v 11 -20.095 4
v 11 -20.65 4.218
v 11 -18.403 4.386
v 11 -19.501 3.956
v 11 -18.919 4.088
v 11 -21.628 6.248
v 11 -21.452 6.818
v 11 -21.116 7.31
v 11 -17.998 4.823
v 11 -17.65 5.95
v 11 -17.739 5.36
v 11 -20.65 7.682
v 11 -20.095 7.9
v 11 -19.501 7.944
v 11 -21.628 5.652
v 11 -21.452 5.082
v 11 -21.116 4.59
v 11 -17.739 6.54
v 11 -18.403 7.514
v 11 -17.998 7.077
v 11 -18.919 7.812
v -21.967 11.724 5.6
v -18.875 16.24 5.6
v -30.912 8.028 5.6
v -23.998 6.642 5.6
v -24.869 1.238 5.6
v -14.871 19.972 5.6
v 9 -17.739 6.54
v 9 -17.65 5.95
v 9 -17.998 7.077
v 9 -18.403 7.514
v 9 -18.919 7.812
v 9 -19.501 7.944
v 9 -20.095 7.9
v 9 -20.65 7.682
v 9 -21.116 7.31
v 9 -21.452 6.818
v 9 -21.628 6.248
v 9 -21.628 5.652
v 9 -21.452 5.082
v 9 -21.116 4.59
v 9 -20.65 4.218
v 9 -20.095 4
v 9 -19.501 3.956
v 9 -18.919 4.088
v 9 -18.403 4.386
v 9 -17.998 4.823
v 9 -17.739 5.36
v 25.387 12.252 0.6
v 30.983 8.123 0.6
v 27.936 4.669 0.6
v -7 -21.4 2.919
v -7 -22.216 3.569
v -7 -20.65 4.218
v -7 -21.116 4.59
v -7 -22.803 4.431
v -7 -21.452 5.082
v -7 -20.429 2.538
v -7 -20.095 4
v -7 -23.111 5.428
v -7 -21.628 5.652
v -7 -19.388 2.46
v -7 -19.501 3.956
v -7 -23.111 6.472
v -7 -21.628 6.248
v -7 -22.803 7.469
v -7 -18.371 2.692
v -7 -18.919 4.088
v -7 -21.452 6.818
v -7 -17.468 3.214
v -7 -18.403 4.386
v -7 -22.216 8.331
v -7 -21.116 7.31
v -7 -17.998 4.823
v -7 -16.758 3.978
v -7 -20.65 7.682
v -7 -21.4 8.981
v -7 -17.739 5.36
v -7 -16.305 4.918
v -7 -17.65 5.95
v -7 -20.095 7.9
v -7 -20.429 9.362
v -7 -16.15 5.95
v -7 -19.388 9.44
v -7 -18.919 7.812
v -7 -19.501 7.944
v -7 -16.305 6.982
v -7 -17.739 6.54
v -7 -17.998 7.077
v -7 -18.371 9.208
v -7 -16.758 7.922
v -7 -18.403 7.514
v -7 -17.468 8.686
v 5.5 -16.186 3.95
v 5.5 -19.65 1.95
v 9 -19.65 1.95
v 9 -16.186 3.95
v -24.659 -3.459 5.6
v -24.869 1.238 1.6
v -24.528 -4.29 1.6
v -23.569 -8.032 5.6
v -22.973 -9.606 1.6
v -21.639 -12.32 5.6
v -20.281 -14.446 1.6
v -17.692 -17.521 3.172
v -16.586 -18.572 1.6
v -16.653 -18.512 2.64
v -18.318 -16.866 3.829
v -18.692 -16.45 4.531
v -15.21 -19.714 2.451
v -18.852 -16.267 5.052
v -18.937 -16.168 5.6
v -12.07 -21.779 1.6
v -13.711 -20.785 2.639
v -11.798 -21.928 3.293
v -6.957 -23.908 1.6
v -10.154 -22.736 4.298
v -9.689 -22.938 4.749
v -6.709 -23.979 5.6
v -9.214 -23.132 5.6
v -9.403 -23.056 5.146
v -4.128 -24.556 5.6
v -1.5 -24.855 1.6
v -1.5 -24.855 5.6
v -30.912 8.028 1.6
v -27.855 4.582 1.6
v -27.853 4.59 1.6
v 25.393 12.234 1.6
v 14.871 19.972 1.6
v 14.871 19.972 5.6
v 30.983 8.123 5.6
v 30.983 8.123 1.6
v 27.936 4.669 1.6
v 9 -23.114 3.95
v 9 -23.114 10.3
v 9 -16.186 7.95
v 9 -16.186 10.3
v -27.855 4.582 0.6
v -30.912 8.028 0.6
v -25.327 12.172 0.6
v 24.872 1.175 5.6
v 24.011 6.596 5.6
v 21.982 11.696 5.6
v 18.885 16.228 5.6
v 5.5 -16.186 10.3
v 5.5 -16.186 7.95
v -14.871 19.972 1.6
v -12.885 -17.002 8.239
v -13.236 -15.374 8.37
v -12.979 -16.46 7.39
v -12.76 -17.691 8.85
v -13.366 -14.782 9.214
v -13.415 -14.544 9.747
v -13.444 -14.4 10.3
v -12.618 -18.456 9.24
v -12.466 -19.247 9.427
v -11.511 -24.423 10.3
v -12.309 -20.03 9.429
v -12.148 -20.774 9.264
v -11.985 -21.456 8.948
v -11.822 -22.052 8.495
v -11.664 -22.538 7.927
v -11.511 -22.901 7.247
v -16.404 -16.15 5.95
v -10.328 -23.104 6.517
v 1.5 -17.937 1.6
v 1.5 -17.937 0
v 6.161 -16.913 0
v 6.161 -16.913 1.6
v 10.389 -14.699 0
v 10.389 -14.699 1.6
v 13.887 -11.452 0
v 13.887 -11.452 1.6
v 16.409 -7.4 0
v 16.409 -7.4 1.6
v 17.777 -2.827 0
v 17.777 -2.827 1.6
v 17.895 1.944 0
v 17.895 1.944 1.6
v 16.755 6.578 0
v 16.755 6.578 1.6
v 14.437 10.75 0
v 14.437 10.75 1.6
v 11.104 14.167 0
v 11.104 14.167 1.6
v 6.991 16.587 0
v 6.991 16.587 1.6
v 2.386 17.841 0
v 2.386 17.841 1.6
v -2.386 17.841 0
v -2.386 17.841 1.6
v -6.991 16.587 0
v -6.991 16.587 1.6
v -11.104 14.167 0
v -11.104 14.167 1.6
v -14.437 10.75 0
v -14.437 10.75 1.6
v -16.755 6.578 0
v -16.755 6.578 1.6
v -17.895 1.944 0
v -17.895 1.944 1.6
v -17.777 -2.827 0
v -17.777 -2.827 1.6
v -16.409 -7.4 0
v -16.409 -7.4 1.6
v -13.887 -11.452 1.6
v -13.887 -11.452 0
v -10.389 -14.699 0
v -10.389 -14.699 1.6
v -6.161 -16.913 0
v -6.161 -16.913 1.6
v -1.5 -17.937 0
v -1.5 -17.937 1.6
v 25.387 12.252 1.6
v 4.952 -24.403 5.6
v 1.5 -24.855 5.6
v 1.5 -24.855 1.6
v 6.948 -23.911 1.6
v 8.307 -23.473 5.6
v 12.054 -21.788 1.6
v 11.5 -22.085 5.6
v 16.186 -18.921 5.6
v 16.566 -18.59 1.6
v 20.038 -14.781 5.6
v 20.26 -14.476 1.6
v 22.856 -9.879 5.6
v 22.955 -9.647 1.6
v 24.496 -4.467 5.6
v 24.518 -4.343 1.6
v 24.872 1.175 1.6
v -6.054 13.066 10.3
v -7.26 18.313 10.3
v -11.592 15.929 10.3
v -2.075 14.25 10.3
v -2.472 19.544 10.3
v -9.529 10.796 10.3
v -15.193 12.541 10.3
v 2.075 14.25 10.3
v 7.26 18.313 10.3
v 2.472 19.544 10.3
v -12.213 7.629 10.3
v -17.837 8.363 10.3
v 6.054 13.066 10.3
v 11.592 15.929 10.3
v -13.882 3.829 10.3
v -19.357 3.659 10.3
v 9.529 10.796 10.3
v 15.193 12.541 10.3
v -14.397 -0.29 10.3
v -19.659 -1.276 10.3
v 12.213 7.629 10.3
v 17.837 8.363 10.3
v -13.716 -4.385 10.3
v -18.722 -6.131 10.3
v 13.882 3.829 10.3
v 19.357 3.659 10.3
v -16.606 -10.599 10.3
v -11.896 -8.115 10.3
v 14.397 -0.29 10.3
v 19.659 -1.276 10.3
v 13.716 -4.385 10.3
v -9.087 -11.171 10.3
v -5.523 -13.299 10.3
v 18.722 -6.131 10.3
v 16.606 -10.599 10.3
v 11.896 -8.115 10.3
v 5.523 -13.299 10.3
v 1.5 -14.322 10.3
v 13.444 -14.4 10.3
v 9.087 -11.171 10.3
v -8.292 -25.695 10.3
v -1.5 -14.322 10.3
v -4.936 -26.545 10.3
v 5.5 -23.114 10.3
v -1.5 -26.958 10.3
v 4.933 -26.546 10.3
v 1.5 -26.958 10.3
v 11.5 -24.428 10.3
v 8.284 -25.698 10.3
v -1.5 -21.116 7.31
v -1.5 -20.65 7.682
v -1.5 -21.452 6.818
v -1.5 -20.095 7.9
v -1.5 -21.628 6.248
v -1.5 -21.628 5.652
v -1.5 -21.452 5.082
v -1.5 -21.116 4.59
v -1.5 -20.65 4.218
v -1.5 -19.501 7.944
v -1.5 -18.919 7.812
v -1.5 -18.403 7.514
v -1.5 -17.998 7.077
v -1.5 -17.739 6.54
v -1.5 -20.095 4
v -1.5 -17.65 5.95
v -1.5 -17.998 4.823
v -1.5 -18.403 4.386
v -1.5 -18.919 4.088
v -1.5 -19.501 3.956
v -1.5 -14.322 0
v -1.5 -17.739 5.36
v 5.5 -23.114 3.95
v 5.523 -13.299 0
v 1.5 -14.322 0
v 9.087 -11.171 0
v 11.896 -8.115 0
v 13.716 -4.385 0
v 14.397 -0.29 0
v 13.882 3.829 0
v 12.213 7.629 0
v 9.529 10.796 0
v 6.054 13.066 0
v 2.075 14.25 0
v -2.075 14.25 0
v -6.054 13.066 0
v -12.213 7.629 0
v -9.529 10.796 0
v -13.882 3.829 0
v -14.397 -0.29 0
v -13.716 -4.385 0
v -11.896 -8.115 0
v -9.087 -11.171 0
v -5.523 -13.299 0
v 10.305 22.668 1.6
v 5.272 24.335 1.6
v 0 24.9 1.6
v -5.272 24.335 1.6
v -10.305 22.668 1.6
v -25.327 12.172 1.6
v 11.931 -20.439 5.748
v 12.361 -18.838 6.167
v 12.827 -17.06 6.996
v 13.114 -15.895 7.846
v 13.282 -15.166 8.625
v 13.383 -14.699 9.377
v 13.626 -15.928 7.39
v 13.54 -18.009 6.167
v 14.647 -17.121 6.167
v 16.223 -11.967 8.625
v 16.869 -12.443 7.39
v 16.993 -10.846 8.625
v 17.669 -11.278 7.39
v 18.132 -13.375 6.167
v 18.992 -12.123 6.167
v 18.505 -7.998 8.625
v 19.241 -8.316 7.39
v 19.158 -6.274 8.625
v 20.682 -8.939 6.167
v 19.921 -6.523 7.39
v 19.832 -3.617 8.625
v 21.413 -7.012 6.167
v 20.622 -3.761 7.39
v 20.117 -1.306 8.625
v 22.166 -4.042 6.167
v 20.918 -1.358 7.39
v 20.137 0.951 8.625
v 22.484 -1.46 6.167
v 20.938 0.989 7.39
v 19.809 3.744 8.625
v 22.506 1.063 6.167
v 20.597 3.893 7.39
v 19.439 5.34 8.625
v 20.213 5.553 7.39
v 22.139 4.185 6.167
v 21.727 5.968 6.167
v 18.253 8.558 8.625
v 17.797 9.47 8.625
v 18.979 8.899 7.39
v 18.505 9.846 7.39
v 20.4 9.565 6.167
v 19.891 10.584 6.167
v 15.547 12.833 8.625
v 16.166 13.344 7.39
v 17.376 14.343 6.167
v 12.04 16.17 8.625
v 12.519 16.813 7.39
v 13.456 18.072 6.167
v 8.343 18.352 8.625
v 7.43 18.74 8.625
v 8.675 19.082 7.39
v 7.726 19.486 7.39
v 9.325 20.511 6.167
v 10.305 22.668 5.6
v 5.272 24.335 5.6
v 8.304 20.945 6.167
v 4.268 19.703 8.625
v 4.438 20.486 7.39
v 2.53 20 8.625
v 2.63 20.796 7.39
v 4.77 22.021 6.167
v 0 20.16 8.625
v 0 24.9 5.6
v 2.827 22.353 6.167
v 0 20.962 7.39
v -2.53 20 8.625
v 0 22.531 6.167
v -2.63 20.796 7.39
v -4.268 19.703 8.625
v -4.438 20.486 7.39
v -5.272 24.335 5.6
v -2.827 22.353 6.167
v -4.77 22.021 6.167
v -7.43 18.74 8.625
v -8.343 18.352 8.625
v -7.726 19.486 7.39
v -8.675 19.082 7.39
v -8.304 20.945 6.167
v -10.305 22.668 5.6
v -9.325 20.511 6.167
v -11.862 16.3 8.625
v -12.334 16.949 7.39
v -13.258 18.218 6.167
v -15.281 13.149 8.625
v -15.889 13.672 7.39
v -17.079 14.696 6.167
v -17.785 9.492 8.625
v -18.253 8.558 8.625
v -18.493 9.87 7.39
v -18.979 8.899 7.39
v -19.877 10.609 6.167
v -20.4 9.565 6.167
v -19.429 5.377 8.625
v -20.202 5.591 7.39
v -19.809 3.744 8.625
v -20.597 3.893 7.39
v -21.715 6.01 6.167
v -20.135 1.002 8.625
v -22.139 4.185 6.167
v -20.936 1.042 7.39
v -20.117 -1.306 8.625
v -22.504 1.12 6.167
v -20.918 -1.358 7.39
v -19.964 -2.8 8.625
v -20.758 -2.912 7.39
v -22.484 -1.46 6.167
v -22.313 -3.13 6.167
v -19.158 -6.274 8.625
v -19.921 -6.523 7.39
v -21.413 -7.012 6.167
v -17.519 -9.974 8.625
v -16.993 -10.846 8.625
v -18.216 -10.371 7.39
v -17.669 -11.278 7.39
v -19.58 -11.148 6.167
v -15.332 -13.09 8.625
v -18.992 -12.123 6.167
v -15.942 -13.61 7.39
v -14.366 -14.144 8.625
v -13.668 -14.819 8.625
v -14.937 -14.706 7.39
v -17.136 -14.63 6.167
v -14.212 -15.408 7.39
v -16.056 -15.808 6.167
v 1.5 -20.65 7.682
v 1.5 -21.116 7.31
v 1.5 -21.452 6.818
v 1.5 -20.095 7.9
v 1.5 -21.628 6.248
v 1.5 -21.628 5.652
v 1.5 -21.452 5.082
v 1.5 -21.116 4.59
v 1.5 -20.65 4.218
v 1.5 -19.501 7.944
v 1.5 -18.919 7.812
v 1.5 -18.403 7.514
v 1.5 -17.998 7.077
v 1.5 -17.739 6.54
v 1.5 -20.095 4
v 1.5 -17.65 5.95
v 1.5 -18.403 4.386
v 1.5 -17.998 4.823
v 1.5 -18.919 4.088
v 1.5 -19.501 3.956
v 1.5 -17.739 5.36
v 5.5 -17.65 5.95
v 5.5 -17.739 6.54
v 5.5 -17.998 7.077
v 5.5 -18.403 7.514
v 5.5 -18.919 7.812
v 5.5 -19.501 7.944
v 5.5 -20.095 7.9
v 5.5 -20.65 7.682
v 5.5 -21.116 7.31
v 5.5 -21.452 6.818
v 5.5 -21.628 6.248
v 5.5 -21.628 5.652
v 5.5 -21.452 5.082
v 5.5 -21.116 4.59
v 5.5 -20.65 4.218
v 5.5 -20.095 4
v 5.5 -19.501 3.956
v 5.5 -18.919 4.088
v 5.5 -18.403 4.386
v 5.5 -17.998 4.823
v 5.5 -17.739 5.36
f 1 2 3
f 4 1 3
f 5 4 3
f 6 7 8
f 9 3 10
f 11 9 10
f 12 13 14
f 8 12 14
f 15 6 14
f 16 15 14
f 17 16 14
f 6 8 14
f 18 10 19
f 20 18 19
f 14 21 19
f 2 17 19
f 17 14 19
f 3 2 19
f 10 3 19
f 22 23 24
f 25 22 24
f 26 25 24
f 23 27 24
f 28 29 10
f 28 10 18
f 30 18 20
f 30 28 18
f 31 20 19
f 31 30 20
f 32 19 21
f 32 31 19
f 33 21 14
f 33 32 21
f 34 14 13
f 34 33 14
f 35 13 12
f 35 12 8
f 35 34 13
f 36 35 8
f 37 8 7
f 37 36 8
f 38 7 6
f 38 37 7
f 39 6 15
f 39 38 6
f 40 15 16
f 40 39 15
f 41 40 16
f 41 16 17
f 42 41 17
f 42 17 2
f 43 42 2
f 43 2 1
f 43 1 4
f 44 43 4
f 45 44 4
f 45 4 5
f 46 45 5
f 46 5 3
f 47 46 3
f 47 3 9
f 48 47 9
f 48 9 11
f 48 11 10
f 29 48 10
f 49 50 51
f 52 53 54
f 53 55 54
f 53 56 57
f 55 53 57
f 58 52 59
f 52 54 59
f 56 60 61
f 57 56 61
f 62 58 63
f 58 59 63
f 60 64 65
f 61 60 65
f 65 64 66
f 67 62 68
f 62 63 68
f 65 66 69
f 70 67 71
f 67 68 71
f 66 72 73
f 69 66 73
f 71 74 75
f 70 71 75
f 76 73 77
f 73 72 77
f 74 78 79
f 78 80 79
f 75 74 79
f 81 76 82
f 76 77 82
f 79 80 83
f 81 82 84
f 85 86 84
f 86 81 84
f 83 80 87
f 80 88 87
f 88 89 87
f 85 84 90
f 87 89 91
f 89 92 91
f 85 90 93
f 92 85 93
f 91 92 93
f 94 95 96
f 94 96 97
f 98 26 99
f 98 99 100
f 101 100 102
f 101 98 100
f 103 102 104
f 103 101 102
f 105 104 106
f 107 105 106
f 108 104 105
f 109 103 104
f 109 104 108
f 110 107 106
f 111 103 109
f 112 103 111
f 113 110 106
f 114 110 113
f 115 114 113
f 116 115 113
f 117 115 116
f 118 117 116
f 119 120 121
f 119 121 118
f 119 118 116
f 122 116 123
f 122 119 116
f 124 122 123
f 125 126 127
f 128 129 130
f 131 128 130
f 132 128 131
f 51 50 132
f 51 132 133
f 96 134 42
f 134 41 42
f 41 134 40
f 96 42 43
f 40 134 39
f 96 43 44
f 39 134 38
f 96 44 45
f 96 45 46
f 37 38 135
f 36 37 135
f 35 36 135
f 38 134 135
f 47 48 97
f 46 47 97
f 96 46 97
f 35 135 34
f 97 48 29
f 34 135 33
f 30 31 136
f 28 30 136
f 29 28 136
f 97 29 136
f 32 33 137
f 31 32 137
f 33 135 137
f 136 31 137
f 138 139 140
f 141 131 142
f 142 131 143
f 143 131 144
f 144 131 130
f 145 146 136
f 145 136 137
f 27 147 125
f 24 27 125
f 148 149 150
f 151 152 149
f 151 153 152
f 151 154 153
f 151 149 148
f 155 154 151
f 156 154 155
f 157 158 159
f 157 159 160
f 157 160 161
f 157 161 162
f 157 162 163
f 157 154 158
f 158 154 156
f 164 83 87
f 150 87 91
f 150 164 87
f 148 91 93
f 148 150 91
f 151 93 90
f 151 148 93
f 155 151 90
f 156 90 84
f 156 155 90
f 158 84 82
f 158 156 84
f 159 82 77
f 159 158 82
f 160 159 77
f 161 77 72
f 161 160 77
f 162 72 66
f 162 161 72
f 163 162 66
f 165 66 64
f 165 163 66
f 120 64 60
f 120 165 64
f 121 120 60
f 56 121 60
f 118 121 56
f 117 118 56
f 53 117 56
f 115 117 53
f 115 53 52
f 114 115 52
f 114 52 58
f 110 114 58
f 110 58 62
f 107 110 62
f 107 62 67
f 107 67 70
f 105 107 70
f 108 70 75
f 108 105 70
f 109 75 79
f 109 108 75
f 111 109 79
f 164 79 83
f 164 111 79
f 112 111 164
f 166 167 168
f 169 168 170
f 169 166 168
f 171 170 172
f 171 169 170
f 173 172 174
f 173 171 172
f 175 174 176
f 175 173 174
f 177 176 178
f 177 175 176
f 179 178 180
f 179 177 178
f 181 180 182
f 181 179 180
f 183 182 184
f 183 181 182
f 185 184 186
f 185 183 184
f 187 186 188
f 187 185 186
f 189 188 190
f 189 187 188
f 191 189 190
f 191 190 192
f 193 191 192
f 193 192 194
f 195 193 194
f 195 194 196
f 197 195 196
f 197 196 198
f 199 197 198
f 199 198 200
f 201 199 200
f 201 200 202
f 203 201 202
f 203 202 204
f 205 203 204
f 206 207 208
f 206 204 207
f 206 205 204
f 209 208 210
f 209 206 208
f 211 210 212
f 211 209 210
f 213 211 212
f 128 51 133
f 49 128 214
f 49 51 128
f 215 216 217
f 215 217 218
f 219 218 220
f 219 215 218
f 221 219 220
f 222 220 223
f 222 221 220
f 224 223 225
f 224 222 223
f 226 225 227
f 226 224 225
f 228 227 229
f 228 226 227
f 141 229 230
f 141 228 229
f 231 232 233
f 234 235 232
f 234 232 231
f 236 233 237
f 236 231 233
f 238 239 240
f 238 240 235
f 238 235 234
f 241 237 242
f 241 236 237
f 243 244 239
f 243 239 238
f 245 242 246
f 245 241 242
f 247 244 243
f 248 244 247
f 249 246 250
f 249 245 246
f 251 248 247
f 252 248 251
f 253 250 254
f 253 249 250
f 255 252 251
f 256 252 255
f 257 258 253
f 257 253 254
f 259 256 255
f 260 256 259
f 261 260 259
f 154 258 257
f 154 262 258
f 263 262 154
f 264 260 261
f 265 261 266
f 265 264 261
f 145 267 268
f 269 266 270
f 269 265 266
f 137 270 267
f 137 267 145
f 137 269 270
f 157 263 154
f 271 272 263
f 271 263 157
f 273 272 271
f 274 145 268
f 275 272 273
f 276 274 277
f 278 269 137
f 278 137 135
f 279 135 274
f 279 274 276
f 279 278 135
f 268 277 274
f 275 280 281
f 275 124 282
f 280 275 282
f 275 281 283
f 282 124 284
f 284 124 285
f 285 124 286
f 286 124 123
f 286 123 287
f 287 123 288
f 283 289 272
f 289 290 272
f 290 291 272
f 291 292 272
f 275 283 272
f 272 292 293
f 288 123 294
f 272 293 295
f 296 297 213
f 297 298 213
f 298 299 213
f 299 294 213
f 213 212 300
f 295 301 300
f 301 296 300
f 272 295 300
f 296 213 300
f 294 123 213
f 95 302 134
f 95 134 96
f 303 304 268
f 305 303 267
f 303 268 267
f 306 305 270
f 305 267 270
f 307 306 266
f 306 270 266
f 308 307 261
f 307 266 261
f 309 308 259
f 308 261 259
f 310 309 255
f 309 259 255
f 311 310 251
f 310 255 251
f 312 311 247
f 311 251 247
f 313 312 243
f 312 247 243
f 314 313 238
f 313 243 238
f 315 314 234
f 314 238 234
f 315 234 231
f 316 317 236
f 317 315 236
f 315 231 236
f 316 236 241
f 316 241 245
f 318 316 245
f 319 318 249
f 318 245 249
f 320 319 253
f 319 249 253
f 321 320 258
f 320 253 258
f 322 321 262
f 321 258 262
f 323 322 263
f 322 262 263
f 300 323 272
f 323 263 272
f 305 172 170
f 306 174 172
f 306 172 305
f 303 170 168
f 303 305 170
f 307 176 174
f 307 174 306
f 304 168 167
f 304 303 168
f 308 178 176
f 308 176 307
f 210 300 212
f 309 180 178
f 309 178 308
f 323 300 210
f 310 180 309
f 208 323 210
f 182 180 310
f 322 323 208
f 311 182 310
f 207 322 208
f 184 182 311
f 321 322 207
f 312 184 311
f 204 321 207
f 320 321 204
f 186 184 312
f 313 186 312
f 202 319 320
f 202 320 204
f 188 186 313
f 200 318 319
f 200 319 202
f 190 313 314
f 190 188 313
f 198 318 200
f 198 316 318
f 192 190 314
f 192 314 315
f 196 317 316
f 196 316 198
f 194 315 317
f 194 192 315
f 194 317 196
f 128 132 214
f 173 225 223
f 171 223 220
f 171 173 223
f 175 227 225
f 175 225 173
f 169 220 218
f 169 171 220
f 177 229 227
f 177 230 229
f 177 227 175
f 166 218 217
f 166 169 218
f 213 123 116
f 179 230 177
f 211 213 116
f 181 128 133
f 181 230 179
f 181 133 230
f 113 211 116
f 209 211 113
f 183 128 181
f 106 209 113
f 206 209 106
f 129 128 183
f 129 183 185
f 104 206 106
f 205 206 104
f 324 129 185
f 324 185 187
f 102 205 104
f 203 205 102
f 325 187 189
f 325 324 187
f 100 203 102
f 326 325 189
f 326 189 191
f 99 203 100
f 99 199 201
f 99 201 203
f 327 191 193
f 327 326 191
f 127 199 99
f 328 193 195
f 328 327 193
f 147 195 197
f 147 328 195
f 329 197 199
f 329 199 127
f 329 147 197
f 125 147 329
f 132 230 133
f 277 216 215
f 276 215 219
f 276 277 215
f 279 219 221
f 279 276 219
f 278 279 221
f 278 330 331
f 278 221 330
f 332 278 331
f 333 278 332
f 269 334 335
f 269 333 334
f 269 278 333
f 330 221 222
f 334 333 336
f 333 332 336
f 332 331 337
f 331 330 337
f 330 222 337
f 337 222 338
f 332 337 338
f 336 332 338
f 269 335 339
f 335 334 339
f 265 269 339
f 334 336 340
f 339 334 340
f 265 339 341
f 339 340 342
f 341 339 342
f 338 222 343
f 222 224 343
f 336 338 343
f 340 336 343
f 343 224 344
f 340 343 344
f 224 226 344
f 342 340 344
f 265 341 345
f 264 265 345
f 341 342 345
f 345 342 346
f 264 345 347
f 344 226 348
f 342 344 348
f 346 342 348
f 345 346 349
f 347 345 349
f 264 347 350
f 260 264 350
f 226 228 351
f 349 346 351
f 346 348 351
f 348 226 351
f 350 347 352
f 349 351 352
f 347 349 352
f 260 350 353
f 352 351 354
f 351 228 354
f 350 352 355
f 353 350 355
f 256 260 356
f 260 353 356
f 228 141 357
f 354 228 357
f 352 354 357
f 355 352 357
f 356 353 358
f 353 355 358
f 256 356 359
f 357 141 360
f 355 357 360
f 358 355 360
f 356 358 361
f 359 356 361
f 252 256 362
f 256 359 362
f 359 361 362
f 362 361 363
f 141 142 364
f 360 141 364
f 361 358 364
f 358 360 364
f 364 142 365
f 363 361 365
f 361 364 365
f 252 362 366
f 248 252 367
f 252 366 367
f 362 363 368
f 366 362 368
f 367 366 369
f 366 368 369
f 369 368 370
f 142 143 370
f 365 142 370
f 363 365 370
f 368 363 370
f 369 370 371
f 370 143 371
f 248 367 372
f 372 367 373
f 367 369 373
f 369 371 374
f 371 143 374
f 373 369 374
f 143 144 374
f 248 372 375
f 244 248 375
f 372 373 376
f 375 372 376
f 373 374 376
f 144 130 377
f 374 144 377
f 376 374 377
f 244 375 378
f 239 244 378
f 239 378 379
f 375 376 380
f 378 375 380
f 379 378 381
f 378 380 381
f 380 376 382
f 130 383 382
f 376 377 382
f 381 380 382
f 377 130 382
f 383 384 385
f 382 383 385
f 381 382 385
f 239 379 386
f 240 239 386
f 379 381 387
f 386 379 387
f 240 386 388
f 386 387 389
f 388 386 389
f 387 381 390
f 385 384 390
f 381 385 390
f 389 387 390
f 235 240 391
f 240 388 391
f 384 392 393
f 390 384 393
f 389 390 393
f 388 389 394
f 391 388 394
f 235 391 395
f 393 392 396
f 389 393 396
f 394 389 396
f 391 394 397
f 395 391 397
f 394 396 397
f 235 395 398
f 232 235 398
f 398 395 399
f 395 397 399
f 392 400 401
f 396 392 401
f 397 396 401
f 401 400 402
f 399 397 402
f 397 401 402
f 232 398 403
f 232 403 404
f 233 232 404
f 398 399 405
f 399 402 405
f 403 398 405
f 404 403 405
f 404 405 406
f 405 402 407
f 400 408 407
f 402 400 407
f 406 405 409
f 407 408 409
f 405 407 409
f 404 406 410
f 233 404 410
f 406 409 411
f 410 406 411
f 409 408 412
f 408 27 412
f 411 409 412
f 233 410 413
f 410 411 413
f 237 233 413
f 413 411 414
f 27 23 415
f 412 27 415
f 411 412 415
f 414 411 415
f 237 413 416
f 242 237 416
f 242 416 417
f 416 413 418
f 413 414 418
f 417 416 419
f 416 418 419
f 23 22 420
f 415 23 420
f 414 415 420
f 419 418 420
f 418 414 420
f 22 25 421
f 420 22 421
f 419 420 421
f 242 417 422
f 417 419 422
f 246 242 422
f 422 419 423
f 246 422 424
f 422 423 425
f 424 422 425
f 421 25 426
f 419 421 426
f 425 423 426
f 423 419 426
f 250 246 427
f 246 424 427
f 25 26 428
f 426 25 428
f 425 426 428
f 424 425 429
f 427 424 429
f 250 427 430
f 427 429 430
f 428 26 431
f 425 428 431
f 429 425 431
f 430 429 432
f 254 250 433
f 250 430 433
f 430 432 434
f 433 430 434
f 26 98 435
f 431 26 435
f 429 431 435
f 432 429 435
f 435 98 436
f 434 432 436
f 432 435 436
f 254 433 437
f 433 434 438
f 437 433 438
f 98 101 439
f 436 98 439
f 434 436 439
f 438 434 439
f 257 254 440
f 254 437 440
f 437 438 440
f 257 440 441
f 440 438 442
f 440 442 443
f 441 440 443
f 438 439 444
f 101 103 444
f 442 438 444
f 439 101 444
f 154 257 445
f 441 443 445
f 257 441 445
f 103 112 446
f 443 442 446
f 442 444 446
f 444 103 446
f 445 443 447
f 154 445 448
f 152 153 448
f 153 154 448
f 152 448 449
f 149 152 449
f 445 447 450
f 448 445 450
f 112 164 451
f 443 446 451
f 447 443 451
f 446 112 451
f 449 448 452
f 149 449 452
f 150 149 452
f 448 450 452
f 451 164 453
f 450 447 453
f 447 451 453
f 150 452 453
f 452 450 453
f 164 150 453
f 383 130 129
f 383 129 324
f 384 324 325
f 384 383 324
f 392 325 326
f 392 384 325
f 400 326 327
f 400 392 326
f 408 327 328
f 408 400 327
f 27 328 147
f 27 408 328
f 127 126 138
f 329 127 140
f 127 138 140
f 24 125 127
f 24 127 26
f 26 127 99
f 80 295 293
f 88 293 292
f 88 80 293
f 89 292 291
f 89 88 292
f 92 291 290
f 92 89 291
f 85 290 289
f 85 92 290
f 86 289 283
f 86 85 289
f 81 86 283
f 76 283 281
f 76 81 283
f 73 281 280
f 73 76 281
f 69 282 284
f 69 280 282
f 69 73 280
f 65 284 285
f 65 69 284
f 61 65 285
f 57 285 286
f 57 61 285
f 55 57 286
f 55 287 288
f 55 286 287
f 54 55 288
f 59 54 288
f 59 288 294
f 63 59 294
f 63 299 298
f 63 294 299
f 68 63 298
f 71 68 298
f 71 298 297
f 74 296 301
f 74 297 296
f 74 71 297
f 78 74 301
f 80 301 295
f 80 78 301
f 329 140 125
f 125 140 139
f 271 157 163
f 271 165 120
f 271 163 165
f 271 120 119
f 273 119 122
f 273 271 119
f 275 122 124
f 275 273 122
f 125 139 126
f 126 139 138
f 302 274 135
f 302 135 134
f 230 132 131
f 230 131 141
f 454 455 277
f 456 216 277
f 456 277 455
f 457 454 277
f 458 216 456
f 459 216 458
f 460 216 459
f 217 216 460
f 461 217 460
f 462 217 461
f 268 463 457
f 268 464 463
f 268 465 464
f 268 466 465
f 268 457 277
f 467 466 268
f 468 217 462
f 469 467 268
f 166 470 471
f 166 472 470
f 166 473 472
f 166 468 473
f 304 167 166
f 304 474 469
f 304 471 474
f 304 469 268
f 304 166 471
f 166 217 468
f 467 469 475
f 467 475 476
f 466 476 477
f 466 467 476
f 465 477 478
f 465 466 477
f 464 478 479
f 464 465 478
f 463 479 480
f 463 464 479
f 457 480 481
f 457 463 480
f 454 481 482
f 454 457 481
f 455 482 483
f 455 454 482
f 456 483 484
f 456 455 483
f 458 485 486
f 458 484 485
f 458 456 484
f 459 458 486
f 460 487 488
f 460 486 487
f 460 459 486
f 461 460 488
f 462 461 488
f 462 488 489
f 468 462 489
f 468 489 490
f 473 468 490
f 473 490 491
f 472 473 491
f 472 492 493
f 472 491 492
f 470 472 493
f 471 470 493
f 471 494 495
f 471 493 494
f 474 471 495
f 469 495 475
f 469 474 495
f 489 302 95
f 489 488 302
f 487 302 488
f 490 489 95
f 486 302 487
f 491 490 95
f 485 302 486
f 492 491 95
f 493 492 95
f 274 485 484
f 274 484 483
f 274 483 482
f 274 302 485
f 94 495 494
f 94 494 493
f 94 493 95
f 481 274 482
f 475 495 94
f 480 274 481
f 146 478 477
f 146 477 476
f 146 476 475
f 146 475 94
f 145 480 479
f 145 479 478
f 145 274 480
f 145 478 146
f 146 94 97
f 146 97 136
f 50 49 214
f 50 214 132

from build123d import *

# Parameters (mm, degrees)
SKETCH003_W     = 3
SKETCH003_H     = 17
POCKET_DEPTH    = 11
SKETCH004_R     = 3.5
POCKET001_DEPTH = 15
SKETCH005_R     = 2
POCKET002_DEPTH = 18
POCKET003_DEPTH = 3.5
PAD_DEPTH       = 4
PAD001_DEPTH    = 1


with BuildPart() as part:
    # Sketch → Revolution (revolve)
    with BuildSketch(Plane.XZ):
        with BuildLine():
            Line((14.4, 0), (14.4, 10.3))
            Line((14.4, 10.3), (19.7, 10.3))
            ThreePointArc((19.7, 10.3), (21.39536, 6.949122), (24.9, 5.6))
            Line((24.9, 1.6), (24.9, 5.6))
            Line((18, 1.6), (24.9, 1.6))
            Line((18, 0), (18, 1.6))
            Line((14.4, 0), (18, 0))
        make_face()
    revolve(axis=Axis((0, 0, 0), (0, 0, 1)))

    # Sketch002 → AdditiveLoft section 0
    with BuildSketch(Plane.XY.offset(5.6)):
        with BuildLine():
            ThreePointArc((-11.510788, -22.079668), (-0.006082, -24.899999), (11.5, -22.085289))
            Line((13.443585, -14.4), (11.5, -22.085289))
            Line((-13.443585, -14.4), (13.443585, -14.4))
            Line((-11.510788, -22.079668), (-13.443585, -14.4))
        make_face()
    # Sketch001 → AdditiveLoft section 1
    with BuildSketch(Plane.XY.offset(10.3)):
        with BuildLine():
            ThreePointArc((-11.510788, -24.423386), (-0.005962, -26.999999), (11.5, -24.428467))
            Line((13.443585, -14.4), (11.5, -24.428467))
            Line((-13.443585, -14.4), (13.443585, -14.4))
            Line((-11.510788, -24.423386), (-13.443585, -14.4))
        make_face()
    loft()

    # Sketch003 → Pocket (cut)
    with BuildSketch(Plane.XY):
        with Locations((0, -20.5)):
            Rectangle(SKETCH003_W, SKETCH003_H)
    extrude(amount=POCKET_DEPTH, mode=Mode.SUBTRACT)

    # Sketch004 → Pocket001 (cut)
    with BuildSketch(Plane.YZ.offset(-22)):
        with Locations((-19.65, 5.95)):
            Circle(SKETCH004_R)
    extrude(amount=POCKET001_DEPTH, mode=Mode.SUBTRACT)

    # Sketch005 → Pocket002 (cut)
    with BuildSketch(Plane.YZ.offset(-7)):
        with Locations((-19.65, 5.95)):
            Circle(SKETCH005_R)
    extrude(amount=POCKET002_DEPTH, mode=Mode.SUBTRACT)

    # Sketch006 → Pocket003 (cut)
    with BuildSketch(Plane.YZ.offset(5.5)):
        Polygon((-16.185898, 3.950001), (-16.185899, 7.950001), (-16.185899, 15.950001), (-23.114102, 15.95), (-23.114102, 3.950001), (-19.65, 1.95), align=None)
    extrude(amount=POCKET003_DEPTH, mode=Mode.SUBTRACT)

    # Sketch007 → Pad (join)
    with BuildSketch(Plane.XY.offset(1.6)):
        with BuildLine():
            ThreePointArc((-14.87057, 19.971884), (-21.967056, 11.724267), (-24.869203, 1.238045))
            Line((-30.912244, 8.027651), (-24.869203, 1.238045))
            Line((-14.87057, 19.971884), (-30.912244, 8.027651))
        make_face()
        with BuildLine():
            Line((14.870569, 19.971885), (30.983027, 8.123311))
            Line((30.983027, 8.123311), (24.87227, 1.174812))
            ThreePointArc((24.87227, 1.174812), (21.981943, 11.696333), (14.870569, 19.971885))
        make_face()
    extrude(amount=PAD_DEPTH)

    # Sketch008 → Pad001 (join)
    with BuildSketch(Plane.XY.offset(0.6)):
        Polygon((25.386727, 12.252334), (30.983027, 8.123311), (27.935703, 4.669279), align=None)
        Polygon((-25.32744, 12.17221), (-30.912244, 8.027651), (-27.855333, 4.582101), align=None)
    extrude(amount=PAD001_DEPTH)


solid = part.part
